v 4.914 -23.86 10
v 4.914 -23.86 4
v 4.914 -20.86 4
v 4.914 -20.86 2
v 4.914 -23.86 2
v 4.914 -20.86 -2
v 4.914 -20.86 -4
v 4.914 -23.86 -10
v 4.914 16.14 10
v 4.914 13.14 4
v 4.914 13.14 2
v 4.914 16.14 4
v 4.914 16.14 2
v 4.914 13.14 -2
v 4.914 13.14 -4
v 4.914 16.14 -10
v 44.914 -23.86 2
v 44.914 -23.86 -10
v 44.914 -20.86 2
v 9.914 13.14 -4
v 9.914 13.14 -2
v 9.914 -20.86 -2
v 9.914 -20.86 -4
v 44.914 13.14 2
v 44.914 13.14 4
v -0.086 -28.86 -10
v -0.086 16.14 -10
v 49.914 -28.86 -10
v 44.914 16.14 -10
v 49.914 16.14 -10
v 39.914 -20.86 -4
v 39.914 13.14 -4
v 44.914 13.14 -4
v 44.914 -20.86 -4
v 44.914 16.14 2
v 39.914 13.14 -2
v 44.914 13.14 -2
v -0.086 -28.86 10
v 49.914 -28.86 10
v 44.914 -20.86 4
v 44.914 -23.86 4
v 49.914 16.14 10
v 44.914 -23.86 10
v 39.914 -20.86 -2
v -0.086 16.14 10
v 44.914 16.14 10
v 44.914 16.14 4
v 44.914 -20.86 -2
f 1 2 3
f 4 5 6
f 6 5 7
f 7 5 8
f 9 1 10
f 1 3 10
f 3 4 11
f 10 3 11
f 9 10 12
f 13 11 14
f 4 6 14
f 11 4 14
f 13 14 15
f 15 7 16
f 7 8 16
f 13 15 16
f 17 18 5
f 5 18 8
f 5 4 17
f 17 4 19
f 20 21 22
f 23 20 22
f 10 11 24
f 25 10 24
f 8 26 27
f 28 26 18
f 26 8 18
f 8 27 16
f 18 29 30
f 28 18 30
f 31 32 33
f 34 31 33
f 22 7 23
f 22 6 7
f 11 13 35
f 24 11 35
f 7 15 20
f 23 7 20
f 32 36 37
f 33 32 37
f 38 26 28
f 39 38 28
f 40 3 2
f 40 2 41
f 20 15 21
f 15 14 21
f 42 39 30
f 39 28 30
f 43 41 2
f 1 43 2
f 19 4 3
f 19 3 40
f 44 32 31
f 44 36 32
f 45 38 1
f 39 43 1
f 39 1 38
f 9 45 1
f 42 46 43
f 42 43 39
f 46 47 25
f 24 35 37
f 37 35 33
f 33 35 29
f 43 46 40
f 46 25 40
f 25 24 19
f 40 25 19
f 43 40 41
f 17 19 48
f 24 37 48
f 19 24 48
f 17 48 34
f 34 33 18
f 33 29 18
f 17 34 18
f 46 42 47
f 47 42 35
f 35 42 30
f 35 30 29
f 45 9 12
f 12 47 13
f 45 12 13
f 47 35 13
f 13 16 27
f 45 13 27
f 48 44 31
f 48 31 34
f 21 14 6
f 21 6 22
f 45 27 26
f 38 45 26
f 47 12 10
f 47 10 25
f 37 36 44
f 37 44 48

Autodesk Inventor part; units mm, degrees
ref_plane "YZ Plane" through (0, 0, 0) normal (1, 0, 0) x (0, 1, 0)
ref_plane "XZ Plane" through (0, 0, 0) normal (0, 1, 0) x (-1, 0, 0)
ref_plane "XY Plane" through (0, 0, 0) normal (0, 0, 1) x (1, 0, 0)
sketch "Sketch1" plane through (0, 0, 0) normal (0, 0, 1) x (1, 0, 0)
  line L0 (4.914, 16.1404) -> (44.914, 16.1404)
  line L1 (44.914, 16.1404) -> (44.914, -23.8596)
  line L2 (44.914, -23.8596) -> (4.914, -23.8596)
  line L3 (4.914, -23.8596) -> (4.914, 16.1404)
  line L4 (49.914, 21.1404) -> (-0.086, 21.1404)
  line L5 (-0.086, 21.1404) -> (-0.086, -28.8596)
  line L6 (-0.086, -28.8596) -> (49.914, -28.8596)
  line L7 (49.914, -28.8596) -> (49.914, 21.1404)
  line L8 (4.914, 16.1404) -> (-0.086, 16.1404)
  line L9 (44.914, 16.1404) -> (49.914, 16.1404)
  line L10 (4.914, -20.8596) -> (44.914, -20.8596)
  line L11 (4.914, 13.1404) -> (44.914, 13.1404)
  line L12 (9.914, 13.1404) -> (9.914, -20.8596)
  line L13 (39.914, 13.1404) -> (39.914, -20.8596)
  point P0 (0, 0)
  dimension "d0" = 40
  dimension "d1" = 40
  dimension "d2" = 5
  dimension "d3" = 3
  dimension "d4" = 3
  dimension "d5" = 5
  dimension "d6" = 5
extrude "Extrusion1" add sketch "Sketch1" along normal mid plane 20 contours L3 L2 L1 L9 L7 L6 L5 L8
extrude "Extrusion2" add sketch "Sketch1" along normal blind 4 contours L0 L1 L11 L3 | L10 L1 L2 L3
extrude "Extrusion3" cut sketch "Sketch1" along normal blind 2 contours L0 L1 L11 L3 | L10 L1 L2 L3
extrude "Extrusion4" add sketch "Sketch1" against normal blind 4 contours L11 L12 L10 L3 | L1 L10 L13 L11
extrude "Extrusion5" cut sketch "Sketch1" against normal blind 2 contours L11 L12 L10 L3 | L1 L10 L13 L11
properties part number "Sensorroom"
